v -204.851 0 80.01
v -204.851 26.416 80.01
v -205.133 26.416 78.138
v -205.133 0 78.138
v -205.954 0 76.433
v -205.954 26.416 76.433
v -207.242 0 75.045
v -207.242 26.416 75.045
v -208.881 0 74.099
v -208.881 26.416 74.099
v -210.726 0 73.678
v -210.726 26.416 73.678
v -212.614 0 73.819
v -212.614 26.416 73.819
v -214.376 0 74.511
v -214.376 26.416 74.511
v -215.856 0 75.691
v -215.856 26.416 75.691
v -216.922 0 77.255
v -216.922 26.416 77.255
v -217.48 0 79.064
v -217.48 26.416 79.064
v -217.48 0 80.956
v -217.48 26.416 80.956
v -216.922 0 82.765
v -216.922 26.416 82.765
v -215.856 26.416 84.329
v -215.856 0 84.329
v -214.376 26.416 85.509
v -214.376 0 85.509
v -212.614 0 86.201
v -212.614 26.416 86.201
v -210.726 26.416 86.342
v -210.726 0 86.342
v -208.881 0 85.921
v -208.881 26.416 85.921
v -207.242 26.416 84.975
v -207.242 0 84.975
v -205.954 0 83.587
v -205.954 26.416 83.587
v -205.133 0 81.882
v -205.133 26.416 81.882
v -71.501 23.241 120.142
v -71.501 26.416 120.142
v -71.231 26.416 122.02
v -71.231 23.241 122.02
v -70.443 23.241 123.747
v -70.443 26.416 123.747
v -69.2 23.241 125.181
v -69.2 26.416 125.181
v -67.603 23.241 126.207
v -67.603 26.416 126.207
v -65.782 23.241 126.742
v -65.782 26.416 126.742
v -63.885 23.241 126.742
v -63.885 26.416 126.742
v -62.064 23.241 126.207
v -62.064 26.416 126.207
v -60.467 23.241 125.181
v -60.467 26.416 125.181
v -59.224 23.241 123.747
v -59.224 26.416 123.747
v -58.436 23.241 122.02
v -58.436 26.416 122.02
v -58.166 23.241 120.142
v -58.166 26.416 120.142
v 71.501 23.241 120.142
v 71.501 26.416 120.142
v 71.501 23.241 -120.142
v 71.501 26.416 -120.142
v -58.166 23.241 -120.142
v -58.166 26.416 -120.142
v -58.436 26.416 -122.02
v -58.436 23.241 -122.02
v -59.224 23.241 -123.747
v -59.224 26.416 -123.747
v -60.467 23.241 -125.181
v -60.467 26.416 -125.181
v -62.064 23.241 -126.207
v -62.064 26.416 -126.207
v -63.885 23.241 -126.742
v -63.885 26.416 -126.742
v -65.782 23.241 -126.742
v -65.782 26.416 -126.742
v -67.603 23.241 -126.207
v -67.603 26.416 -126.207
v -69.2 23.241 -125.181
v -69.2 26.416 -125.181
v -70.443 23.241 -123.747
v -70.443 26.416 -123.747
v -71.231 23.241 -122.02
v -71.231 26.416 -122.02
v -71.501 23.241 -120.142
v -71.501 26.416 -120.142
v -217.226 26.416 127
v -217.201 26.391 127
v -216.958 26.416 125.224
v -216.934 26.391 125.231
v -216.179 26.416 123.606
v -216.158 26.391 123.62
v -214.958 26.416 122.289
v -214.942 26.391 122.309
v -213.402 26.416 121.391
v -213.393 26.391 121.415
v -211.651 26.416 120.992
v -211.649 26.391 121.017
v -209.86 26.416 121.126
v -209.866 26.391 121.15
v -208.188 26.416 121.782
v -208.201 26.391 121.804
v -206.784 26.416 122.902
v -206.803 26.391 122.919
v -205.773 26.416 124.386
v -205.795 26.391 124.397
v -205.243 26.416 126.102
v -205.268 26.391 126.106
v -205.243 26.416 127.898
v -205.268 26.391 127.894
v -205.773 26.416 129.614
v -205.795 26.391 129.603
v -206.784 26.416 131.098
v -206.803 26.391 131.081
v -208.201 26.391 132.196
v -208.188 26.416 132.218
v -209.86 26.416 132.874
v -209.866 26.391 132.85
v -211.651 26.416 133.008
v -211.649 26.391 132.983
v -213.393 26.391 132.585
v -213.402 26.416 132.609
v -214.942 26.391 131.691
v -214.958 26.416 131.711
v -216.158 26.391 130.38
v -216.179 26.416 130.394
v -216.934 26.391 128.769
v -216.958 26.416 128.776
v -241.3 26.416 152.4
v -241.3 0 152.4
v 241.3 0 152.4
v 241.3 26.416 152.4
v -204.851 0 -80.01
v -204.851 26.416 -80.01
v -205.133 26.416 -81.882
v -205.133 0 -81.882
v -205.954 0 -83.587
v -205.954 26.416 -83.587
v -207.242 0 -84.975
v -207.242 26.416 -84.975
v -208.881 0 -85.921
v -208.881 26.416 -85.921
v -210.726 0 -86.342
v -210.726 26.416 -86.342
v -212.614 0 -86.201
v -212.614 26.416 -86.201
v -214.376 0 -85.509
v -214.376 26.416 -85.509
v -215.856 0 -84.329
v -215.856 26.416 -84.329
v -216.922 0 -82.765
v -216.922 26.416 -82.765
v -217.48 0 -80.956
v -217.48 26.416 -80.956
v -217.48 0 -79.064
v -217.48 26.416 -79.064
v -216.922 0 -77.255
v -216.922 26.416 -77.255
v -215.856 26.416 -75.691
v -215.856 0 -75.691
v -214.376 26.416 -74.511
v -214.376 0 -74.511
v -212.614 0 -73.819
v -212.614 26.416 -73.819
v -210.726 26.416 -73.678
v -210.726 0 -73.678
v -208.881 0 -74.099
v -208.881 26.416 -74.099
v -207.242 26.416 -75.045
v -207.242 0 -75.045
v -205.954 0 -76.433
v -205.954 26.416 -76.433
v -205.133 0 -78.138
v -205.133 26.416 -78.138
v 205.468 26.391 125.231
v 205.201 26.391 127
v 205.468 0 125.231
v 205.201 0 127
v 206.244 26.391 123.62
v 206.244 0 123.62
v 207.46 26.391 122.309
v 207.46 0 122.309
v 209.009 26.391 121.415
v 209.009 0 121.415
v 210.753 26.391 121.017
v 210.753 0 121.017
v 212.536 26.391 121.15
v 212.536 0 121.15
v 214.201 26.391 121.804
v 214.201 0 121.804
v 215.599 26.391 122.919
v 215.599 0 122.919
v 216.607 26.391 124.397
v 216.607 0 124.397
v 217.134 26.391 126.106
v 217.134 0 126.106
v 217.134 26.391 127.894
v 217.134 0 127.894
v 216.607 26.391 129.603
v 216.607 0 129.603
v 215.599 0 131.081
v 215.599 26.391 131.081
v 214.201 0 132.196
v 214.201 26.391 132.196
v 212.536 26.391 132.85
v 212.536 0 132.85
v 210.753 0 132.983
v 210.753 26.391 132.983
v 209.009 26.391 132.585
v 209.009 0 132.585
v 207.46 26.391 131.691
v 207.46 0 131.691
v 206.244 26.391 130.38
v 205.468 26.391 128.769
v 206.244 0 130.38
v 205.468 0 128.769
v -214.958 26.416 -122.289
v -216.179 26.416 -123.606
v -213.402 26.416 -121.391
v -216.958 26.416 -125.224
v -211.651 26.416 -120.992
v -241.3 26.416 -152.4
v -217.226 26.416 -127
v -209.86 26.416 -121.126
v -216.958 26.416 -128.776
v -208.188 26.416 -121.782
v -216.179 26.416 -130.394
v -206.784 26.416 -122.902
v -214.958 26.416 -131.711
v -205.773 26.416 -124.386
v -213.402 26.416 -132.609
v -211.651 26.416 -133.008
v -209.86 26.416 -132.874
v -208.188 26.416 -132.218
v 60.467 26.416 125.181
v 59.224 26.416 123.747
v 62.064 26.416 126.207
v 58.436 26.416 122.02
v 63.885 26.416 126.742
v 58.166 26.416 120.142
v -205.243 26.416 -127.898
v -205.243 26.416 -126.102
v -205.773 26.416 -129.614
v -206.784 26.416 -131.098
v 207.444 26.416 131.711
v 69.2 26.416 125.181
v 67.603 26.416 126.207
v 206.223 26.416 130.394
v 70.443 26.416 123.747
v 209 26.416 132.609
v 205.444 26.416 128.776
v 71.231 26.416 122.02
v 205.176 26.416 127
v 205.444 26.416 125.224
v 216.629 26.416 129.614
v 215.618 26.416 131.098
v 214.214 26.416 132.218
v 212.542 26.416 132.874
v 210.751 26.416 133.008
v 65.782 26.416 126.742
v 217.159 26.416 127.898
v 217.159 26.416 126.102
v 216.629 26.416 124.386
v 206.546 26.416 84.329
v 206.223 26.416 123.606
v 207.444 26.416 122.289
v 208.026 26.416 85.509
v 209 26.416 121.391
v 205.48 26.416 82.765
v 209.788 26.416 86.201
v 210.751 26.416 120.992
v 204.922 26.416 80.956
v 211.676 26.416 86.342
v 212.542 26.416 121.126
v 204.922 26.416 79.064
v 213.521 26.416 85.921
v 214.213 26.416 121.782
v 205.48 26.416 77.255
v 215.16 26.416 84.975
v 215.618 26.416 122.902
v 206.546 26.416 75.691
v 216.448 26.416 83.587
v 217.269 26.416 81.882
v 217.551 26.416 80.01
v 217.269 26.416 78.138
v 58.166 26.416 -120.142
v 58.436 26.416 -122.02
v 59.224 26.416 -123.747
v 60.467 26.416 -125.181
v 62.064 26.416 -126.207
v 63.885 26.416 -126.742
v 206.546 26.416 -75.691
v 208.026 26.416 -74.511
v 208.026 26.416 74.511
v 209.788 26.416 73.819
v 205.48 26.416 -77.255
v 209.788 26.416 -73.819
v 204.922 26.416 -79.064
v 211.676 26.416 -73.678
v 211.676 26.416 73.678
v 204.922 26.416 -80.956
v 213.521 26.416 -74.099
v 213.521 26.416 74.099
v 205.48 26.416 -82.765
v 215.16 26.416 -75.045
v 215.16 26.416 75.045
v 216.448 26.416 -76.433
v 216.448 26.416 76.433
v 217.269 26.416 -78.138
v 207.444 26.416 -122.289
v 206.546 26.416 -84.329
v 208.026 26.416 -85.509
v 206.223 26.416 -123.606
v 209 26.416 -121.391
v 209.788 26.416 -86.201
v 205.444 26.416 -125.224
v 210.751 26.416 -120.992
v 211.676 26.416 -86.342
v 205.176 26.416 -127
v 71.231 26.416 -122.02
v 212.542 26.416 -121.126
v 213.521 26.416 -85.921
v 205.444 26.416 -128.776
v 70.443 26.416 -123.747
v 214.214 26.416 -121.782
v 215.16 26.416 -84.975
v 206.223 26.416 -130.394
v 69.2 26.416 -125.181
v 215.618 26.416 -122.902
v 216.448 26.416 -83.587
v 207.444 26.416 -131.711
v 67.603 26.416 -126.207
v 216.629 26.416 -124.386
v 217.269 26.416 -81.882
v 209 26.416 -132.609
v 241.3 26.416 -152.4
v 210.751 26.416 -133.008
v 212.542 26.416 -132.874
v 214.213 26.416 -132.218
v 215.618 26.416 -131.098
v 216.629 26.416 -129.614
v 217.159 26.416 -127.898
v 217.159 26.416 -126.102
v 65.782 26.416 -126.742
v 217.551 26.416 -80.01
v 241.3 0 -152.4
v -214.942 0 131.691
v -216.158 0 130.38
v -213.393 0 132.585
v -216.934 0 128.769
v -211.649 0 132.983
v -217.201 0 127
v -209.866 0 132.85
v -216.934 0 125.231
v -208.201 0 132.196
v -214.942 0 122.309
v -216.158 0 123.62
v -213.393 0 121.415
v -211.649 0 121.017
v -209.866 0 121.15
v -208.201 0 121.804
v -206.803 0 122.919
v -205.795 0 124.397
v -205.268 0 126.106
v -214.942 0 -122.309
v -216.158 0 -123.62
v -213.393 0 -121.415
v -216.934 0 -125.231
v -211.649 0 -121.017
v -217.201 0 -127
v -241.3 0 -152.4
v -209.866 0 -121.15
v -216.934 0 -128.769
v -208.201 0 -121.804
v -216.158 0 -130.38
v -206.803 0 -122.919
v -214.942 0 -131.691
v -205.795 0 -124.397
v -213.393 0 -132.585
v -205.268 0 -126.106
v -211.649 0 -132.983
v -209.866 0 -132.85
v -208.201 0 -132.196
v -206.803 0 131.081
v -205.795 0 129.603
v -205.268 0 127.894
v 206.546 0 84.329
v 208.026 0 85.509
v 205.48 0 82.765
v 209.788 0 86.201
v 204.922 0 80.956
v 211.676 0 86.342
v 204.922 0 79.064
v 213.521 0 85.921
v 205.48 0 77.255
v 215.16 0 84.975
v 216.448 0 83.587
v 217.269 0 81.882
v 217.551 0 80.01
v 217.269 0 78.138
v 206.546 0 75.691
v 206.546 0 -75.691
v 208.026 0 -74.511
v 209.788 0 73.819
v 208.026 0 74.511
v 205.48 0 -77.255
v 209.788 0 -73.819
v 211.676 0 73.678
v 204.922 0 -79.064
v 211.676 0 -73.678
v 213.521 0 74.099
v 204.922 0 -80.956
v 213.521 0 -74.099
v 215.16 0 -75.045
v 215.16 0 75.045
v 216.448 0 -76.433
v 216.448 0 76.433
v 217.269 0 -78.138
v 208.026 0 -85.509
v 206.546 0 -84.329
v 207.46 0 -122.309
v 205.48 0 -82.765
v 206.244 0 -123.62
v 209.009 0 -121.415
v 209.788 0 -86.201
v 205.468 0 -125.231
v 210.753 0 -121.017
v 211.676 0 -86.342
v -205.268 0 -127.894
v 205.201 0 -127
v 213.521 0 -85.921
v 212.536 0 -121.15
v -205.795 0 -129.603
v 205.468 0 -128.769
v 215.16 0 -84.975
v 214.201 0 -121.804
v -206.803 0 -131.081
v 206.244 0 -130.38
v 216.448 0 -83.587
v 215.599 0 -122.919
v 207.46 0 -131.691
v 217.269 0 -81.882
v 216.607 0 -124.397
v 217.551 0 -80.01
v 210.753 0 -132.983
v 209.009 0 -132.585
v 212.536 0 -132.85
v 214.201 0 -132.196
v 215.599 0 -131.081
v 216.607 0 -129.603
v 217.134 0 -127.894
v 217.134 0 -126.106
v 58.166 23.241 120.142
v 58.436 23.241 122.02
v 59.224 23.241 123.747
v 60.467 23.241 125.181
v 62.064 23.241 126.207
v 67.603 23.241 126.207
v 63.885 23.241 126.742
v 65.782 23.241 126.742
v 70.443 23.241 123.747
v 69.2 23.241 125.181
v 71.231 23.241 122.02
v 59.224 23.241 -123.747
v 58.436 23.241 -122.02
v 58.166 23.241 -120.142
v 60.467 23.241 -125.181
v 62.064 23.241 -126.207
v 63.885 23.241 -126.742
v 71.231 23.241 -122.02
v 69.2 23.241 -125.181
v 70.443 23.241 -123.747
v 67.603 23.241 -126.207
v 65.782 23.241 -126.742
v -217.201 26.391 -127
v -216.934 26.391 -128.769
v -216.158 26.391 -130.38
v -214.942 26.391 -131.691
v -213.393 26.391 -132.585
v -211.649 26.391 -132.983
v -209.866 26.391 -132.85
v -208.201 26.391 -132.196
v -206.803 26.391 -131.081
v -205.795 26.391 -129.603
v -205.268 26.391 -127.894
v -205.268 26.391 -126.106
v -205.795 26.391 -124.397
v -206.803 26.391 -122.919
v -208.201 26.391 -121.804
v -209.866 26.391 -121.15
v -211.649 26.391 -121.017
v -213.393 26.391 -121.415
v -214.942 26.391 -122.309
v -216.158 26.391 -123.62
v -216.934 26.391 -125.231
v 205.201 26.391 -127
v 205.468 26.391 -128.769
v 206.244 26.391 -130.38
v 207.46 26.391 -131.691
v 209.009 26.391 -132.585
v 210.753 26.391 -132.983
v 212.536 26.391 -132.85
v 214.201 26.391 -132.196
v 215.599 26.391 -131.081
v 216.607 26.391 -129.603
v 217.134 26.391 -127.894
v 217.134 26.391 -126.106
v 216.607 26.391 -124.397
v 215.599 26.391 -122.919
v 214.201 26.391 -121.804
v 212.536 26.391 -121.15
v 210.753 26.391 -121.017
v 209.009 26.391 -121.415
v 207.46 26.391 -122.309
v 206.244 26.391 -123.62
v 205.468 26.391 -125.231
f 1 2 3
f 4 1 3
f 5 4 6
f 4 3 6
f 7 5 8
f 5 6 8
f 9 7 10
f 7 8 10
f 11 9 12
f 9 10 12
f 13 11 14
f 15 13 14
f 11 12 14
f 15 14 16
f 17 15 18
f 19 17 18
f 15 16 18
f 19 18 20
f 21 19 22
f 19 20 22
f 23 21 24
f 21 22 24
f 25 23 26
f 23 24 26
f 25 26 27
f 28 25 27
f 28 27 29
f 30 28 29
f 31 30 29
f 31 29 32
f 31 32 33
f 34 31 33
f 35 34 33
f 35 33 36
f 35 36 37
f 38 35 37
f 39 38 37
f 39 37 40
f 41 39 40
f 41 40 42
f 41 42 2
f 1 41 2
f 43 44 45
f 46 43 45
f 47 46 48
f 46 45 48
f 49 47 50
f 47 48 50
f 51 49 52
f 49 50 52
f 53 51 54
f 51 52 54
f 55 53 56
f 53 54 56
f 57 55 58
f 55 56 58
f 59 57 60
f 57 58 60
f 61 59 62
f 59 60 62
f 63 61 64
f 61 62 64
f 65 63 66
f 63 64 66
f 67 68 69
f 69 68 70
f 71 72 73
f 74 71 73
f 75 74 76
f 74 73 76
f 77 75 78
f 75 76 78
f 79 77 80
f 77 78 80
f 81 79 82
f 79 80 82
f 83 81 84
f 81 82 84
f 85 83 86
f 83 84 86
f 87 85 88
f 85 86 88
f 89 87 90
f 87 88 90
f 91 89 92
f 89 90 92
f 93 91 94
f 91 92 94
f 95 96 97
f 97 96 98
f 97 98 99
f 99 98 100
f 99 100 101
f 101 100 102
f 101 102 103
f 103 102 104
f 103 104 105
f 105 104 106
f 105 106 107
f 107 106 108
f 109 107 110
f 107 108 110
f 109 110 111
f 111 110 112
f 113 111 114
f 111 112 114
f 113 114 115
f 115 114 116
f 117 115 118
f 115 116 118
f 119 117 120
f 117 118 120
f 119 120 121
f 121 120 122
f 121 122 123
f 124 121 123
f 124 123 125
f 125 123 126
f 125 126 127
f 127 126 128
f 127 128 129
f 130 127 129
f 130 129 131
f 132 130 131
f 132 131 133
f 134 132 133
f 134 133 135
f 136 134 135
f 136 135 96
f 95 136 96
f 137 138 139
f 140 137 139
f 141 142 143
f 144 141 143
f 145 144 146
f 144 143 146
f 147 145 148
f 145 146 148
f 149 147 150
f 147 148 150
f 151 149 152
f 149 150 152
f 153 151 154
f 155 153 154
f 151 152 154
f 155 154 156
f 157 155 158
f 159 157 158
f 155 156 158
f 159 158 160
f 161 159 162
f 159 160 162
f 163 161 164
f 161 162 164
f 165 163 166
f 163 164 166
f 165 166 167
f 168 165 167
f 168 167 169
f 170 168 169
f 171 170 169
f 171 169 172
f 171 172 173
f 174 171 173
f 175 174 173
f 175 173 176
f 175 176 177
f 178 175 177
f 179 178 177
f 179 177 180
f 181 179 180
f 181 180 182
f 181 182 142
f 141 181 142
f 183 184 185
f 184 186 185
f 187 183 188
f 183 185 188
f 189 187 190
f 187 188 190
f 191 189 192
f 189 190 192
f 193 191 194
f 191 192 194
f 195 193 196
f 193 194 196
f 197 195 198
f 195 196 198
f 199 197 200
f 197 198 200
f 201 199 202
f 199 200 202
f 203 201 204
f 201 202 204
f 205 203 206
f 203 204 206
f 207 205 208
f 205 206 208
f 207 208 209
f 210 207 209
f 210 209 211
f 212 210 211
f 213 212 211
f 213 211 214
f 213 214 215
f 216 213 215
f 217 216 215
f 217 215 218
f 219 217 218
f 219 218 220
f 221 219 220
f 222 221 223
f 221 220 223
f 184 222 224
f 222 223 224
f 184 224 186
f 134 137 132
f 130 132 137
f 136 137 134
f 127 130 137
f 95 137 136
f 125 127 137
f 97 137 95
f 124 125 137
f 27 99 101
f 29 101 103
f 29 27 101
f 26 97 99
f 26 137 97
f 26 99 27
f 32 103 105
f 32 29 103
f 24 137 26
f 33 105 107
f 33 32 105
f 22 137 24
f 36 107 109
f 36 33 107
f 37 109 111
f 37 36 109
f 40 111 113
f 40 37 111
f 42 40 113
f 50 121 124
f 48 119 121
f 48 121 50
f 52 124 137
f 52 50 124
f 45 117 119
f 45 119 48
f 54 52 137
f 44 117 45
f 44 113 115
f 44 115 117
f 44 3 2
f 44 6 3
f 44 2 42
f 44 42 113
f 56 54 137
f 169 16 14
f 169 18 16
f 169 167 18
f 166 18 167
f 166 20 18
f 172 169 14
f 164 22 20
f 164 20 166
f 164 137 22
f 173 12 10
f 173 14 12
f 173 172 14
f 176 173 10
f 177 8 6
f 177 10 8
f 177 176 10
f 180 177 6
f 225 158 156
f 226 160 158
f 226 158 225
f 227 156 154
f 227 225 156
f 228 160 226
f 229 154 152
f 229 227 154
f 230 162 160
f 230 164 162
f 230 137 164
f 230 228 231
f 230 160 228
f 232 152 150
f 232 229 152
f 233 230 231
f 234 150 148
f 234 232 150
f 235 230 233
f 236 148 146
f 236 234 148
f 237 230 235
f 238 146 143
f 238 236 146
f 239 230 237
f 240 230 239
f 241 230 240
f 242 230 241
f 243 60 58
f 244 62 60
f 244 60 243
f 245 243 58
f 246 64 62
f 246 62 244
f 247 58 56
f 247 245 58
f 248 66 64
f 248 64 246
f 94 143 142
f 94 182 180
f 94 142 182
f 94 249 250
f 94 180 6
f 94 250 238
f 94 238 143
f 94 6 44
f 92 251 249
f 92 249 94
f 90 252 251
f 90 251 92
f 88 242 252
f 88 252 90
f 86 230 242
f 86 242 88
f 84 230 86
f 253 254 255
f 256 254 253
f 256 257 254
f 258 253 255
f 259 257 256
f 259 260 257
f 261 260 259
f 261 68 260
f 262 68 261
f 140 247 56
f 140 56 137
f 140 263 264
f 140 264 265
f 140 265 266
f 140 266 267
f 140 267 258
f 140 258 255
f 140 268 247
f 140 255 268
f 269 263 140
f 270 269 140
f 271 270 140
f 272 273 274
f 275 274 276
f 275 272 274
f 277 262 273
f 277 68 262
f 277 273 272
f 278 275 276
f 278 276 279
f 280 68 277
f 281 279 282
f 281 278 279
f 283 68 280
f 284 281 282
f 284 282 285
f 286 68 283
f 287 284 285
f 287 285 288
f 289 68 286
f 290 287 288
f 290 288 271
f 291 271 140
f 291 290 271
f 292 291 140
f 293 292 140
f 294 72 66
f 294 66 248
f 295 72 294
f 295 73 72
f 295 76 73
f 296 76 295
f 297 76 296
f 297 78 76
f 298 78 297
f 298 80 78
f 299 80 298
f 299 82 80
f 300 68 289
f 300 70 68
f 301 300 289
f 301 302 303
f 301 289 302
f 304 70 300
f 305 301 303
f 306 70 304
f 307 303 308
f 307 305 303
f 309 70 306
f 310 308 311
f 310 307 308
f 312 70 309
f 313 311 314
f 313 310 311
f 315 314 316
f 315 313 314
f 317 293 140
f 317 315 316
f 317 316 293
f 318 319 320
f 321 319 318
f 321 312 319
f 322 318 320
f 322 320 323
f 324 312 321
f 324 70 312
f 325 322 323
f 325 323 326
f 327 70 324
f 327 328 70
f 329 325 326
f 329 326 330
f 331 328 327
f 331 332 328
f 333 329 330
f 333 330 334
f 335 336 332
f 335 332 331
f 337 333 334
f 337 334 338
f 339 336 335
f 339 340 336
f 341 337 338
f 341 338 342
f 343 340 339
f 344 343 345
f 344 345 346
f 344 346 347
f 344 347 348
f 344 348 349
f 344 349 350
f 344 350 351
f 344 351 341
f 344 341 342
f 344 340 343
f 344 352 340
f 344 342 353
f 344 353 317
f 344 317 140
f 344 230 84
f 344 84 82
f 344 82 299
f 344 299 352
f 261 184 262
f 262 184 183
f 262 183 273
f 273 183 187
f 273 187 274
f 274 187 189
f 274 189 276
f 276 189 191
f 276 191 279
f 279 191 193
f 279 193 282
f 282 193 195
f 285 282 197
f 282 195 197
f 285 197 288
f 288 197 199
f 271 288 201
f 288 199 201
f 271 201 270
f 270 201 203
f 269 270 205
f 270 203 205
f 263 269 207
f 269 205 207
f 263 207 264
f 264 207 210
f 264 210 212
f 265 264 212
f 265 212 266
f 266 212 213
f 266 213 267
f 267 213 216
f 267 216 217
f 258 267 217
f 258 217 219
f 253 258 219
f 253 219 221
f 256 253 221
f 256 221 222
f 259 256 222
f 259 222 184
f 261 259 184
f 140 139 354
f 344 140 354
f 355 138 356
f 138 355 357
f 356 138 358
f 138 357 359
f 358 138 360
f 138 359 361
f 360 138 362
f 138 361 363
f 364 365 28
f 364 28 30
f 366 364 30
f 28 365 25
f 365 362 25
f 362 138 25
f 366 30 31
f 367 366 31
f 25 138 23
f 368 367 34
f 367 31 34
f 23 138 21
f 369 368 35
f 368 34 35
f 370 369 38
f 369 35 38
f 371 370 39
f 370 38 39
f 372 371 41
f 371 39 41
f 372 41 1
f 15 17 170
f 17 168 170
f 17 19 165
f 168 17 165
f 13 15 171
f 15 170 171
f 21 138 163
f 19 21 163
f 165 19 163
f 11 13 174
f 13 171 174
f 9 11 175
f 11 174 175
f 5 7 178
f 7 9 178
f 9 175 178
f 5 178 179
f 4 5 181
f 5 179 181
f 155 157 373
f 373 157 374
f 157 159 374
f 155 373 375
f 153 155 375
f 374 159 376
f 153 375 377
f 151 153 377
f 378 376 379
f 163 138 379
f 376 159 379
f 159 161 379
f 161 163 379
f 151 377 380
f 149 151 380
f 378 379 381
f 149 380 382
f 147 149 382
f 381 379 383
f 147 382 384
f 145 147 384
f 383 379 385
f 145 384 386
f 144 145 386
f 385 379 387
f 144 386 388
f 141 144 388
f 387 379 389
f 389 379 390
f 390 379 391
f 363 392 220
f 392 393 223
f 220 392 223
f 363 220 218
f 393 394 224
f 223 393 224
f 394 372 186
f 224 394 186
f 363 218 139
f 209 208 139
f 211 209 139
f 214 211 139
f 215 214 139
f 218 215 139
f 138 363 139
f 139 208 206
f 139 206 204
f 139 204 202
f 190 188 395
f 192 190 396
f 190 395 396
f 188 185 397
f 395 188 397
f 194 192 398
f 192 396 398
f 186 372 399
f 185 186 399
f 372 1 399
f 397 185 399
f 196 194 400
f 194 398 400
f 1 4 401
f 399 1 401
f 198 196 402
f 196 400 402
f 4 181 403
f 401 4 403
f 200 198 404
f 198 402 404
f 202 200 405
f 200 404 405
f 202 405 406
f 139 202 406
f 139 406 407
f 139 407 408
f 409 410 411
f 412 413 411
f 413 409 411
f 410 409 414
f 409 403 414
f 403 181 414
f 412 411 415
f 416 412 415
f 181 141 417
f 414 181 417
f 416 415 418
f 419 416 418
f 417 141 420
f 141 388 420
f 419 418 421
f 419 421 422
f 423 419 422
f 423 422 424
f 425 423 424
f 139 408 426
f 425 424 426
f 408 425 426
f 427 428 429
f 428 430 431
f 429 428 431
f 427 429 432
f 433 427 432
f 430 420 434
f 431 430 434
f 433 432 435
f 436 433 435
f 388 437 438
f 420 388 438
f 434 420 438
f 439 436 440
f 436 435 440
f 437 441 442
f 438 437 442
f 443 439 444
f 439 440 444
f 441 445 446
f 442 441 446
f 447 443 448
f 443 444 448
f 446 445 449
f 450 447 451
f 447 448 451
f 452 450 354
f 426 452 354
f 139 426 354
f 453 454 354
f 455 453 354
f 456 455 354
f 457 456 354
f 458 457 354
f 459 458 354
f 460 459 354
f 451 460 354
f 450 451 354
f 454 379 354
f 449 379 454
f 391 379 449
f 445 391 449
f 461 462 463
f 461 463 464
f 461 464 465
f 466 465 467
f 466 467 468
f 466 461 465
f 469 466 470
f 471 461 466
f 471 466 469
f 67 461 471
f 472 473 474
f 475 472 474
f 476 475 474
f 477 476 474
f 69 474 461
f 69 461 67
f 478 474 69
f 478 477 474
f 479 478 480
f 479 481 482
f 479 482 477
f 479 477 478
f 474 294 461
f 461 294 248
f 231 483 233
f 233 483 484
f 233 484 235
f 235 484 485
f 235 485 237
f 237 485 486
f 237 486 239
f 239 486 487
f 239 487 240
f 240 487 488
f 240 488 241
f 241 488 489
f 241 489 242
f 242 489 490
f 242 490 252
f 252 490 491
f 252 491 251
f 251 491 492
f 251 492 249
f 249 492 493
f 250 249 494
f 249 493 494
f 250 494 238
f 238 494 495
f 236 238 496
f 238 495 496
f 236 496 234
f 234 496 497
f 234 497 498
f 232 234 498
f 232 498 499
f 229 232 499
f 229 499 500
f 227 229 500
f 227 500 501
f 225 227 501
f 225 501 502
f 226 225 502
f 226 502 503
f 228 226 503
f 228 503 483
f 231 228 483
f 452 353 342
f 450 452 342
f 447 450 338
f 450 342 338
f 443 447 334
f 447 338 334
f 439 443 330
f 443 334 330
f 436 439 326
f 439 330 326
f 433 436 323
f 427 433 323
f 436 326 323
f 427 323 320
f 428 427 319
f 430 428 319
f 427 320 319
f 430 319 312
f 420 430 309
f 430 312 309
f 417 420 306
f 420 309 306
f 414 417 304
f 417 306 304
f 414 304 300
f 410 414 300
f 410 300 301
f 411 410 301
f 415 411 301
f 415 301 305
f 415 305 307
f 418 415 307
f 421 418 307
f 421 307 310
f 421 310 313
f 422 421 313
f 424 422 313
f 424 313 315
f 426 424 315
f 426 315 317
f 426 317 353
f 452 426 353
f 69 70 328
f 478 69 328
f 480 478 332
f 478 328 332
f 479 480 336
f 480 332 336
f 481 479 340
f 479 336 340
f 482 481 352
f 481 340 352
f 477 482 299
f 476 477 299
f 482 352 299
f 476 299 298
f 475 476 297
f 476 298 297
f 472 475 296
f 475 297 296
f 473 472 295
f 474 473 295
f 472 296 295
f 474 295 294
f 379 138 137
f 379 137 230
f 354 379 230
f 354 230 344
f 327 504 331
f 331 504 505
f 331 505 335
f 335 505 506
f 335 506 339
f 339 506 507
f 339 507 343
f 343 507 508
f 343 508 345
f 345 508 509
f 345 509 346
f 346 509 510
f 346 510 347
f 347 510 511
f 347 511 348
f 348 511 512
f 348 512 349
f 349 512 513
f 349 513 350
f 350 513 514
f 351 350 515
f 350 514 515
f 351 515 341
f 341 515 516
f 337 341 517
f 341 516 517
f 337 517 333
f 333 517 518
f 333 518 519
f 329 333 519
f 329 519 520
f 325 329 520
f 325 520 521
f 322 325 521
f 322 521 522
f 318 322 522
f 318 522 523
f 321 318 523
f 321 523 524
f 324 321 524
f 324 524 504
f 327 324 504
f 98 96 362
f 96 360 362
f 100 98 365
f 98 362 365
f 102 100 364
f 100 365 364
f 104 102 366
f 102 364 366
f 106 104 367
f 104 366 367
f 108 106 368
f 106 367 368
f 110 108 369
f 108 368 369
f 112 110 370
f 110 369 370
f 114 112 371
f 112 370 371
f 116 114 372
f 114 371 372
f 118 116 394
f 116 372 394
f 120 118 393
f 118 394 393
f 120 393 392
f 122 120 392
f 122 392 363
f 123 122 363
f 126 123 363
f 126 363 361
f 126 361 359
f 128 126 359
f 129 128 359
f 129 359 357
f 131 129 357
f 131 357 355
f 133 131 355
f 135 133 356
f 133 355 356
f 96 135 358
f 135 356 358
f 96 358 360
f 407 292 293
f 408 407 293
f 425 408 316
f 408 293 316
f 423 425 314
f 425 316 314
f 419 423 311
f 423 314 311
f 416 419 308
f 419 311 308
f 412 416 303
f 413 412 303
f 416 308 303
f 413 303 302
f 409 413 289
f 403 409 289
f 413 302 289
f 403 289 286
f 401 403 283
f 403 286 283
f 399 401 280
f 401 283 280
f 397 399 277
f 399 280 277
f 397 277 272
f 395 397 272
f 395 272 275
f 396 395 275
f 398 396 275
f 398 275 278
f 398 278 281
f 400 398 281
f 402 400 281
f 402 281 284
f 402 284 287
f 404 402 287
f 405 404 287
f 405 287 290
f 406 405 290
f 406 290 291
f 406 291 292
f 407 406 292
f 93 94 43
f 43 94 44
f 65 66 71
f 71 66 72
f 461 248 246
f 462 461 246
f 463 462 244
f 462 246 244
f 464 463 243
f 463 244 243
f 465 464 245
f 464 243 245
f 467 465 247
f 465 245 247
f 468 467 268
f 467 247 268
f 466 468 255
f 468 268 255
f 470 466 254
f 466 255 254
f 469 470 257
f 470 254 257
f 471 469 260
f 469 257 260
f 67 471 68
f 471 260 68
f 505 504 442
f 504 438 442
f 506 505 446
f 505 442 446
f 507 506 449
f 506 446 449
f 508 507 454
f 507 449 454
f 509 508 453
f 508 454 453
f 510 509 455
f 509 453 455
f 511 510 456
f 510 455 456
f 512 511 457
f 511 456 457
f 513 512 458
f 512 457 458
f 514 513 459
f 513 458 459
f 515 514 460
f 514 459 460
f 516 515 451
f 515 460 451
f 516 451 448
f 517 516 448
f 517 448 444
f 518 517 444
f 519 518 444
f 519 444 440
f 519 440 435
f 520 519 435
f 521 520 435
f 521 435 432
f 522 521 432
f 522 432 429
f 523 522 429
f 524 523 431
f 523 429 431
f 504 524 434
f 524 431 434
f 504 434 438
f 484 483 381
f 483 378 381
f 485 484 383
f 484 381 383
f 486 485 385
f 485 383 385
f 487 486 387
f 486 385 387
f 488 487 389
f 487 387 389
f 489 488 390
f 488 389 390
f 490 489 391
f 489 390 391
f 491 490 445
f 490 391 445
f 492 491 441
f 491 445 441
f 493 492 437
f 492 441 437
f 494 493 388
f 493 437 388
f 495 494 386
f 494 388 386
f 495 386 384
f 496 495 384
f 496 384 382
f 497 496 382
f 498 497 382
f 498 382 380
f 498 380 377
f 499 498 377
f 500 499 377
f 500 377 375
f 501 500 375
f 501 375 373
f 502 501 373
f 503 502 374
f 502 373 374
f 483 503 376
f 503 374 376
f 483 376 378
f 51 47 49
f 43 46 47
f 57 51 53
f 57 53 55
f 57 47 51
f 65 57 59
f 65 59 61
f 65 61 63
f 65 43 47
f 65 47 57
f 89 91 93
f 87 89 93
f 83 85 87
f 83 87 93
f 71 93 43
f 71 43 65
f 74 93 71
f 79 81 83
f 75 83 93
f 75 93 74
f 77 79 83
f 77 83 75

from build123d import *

# Parameters (mm, degrees)
SKETCH1_W                       = 482.6
SKETCH1_H                       = 304.8
BOSS_EXTRUDE1_DEPTH             = 26.416
CUT_EXTRUDE3_DEPTH              = 3.175
SKETCH3_R                       = 6.35
SKETCH3_R_2                     = 2.54
CUT_EXTRUDE2_DEPTH              = 27.416
M10_CLEARANCE_HOLE2_D           = 12
M10_CLEARANCE_HOLE2_CSINK_D     = 12.05
M10_CLEARANCE_HOLE2_CSINK_ANGLE = 90
M10_CLEARANCE_HOLE3_D           = 12
M10_CLEARANCE_HOLE3_CSINK_D     = 12.05
M10_CLEARANCE_HOLE3_CSINK_ANGLE = 90


with BuildPart() as part:
    # Sketch1 → Boss-Extrude1 (new body)
    with BuildSketch(Plane(origin=(0, 0, 0), x_dir=(1, 0, 0), z_dir=(0, 1, 0))):
        Rectangle(SKETCH1_W, SKETCH1_H)
    extrude(amount=BOSS_EXTRUDE1_DEPTH)

    # Sketch2 → Cut-Extrude3 (cut)
    with BuildSketch(Plane(origin=(0, 26.416, 0), x_dir=(1, 0, 0), z_dir=(0, 1, 0))):
        with BuildLine():
            Line((-71.501, 120.142), (-71.501, -120.142))
            ThreePointArc((-71.501, -120.142), (-64.8335, -113.4745), (-58.166, -120.142))
            Line((-58.166, -120.142), (-58.166, 120.142))
            ThreePointArc((-58.166, 120.142), (-64.8335, 113.4745), (-71.501, 120.142))
        make_face()
        with BuildLine():
            ThreePointArc((-58.166, 120.142), (-64.8335, 126.8095), (-71.501, 120.142))
            Line((-71.501, 120.142), (-58.166, 120.142))
        make_face()
        with BuildLine():
            Line((-58.166, 120.142), (-71.501, 120.142))
            ThreePointArc((-71.501, 120.142), (-64.8335, 113.4745), (-58.166, 120.142))
        make_face()
        with BuildLine():
            ThreePointArc((-58.166, -120.142), (-64.8335, -113.4745), (-71.501, -120.142))
            Line((-71.501, -120.142), (-58.166, -120.142))
        make_face()
        with BuildLine():
            Line((-58.166, -120.142), (-71.501, -120.142))
            ThreePointArc((-71.501, -120.142), (-64.8335, -126.8095), (-58.166, -120.142))
        make_face()
        with BuildLine():
            ThreePointArc((58.166, 120.142), (64.8335, 113.4745), (71.501, 120.142))
            Line((71.501, 120.142), (58.166, 120.142))
        make_face()
        with BuildLine():
            Line((58.166, 120.142), (71.501, 120.142))
            ThreePointArc((71.501, 120.142), (64.8335, 126.8095), (58.166, 120.142))
        make_face()
        with BuildLine():
            Line((71.501, -120.142), (71.501, 120.142))
            ThreePointArc((71.501, 120.142), (64.8335, 113.4745), (58.166, 120.142))
            Line((58.166, 120.142), (58.166, -120.142))
            ThreePointArc((58.166, -120.142), (64.8335, -113.4745), (71.501, -120.142))
        make_face()
        with BuildLine():
            ThreePointArc((58.166, -120.142), (64.8335, -126.8095), (71.501, -120.142))
            Line((71.501, -120.142), (58.166, -120.142))
        make_face()
        with BuildLine():
            Line((58.166, -120.142), (71.501, -120.142))
            ThreePointArc((71.501, -120.142), (64.8335, -113.4745), (58.166, -120.142))
        make_face()
    extrude(amount=-CUT_EXTRUDE3_DEPTH, mode=Mode.SUBTRACT)

    # Sketch3 → Cut-Extrude2 (cut, through all)
    with BuildSketch(Plane(origin=(0, 26.416, 0), x_dir=(1, 0, 0), z_dir=(0, 1, 0))):
        with Locations((-211.201, -80.01)):
            Circle(SKETCH3_R)
        with Locations((-211.201, 80.01)):
            Circle(SKETCH3_R)
        with Locations((211.201, -80.01)):
            Circle(SKETCH3_R)
        with Locations((211.201, 80.01)):
            Circle(SKETCH3_R)
        with Locations((-211.201, -127)):
            Circle(SKETCH3_R_2)
        with Locations((-211.201, 127)):
            Circle(SKETCH3_R_2)
        with Locations((211.201, -127)):
            Circle(SKETCH3_R_2)
        with Locations((211.201, 127)):
            Circle(SKETCH3_R_2)
    extrude(amount=-CUT_EXTRUDE2_DEPTH, mode=Mode.SUBTRACT)

    # M10 Clearance Hole2 (through all)
    with Locations(Plane(origin=(0, 26.416, 0), x_dir=(1, 0, 0), z_dir=(0, 1, 0))):
        with Locations((-211.201, -127)):
            CounterSinkHole(M10_CLEARANCE_HOLE2_D / 2, M10_CLEARANCE_HOLE2_CSINK_D / 2, counter_sink_angle=M10_CLEARANCE_HOLE2_CSINK_ANGLE)

    # M10 Clearance Hole3 (through all)
    with Locations(Plane(origin=(0, 26.416, 0), x_dir=(1, 0, 0), z_dir=(0, 1, 0))):
        with Locations((-211.201, 127), (211.201, 127), (211.201, -127)):
            CounterSinkHole(M10_CLEARANCE_HOLE3_D / 2, M10_CLEARANCE_HOLE3_CSINK_D / 2, counter_sink_angle=M10_CLEARANCE_HOLE3_CSINK_ANGLE)


solid = part.part
